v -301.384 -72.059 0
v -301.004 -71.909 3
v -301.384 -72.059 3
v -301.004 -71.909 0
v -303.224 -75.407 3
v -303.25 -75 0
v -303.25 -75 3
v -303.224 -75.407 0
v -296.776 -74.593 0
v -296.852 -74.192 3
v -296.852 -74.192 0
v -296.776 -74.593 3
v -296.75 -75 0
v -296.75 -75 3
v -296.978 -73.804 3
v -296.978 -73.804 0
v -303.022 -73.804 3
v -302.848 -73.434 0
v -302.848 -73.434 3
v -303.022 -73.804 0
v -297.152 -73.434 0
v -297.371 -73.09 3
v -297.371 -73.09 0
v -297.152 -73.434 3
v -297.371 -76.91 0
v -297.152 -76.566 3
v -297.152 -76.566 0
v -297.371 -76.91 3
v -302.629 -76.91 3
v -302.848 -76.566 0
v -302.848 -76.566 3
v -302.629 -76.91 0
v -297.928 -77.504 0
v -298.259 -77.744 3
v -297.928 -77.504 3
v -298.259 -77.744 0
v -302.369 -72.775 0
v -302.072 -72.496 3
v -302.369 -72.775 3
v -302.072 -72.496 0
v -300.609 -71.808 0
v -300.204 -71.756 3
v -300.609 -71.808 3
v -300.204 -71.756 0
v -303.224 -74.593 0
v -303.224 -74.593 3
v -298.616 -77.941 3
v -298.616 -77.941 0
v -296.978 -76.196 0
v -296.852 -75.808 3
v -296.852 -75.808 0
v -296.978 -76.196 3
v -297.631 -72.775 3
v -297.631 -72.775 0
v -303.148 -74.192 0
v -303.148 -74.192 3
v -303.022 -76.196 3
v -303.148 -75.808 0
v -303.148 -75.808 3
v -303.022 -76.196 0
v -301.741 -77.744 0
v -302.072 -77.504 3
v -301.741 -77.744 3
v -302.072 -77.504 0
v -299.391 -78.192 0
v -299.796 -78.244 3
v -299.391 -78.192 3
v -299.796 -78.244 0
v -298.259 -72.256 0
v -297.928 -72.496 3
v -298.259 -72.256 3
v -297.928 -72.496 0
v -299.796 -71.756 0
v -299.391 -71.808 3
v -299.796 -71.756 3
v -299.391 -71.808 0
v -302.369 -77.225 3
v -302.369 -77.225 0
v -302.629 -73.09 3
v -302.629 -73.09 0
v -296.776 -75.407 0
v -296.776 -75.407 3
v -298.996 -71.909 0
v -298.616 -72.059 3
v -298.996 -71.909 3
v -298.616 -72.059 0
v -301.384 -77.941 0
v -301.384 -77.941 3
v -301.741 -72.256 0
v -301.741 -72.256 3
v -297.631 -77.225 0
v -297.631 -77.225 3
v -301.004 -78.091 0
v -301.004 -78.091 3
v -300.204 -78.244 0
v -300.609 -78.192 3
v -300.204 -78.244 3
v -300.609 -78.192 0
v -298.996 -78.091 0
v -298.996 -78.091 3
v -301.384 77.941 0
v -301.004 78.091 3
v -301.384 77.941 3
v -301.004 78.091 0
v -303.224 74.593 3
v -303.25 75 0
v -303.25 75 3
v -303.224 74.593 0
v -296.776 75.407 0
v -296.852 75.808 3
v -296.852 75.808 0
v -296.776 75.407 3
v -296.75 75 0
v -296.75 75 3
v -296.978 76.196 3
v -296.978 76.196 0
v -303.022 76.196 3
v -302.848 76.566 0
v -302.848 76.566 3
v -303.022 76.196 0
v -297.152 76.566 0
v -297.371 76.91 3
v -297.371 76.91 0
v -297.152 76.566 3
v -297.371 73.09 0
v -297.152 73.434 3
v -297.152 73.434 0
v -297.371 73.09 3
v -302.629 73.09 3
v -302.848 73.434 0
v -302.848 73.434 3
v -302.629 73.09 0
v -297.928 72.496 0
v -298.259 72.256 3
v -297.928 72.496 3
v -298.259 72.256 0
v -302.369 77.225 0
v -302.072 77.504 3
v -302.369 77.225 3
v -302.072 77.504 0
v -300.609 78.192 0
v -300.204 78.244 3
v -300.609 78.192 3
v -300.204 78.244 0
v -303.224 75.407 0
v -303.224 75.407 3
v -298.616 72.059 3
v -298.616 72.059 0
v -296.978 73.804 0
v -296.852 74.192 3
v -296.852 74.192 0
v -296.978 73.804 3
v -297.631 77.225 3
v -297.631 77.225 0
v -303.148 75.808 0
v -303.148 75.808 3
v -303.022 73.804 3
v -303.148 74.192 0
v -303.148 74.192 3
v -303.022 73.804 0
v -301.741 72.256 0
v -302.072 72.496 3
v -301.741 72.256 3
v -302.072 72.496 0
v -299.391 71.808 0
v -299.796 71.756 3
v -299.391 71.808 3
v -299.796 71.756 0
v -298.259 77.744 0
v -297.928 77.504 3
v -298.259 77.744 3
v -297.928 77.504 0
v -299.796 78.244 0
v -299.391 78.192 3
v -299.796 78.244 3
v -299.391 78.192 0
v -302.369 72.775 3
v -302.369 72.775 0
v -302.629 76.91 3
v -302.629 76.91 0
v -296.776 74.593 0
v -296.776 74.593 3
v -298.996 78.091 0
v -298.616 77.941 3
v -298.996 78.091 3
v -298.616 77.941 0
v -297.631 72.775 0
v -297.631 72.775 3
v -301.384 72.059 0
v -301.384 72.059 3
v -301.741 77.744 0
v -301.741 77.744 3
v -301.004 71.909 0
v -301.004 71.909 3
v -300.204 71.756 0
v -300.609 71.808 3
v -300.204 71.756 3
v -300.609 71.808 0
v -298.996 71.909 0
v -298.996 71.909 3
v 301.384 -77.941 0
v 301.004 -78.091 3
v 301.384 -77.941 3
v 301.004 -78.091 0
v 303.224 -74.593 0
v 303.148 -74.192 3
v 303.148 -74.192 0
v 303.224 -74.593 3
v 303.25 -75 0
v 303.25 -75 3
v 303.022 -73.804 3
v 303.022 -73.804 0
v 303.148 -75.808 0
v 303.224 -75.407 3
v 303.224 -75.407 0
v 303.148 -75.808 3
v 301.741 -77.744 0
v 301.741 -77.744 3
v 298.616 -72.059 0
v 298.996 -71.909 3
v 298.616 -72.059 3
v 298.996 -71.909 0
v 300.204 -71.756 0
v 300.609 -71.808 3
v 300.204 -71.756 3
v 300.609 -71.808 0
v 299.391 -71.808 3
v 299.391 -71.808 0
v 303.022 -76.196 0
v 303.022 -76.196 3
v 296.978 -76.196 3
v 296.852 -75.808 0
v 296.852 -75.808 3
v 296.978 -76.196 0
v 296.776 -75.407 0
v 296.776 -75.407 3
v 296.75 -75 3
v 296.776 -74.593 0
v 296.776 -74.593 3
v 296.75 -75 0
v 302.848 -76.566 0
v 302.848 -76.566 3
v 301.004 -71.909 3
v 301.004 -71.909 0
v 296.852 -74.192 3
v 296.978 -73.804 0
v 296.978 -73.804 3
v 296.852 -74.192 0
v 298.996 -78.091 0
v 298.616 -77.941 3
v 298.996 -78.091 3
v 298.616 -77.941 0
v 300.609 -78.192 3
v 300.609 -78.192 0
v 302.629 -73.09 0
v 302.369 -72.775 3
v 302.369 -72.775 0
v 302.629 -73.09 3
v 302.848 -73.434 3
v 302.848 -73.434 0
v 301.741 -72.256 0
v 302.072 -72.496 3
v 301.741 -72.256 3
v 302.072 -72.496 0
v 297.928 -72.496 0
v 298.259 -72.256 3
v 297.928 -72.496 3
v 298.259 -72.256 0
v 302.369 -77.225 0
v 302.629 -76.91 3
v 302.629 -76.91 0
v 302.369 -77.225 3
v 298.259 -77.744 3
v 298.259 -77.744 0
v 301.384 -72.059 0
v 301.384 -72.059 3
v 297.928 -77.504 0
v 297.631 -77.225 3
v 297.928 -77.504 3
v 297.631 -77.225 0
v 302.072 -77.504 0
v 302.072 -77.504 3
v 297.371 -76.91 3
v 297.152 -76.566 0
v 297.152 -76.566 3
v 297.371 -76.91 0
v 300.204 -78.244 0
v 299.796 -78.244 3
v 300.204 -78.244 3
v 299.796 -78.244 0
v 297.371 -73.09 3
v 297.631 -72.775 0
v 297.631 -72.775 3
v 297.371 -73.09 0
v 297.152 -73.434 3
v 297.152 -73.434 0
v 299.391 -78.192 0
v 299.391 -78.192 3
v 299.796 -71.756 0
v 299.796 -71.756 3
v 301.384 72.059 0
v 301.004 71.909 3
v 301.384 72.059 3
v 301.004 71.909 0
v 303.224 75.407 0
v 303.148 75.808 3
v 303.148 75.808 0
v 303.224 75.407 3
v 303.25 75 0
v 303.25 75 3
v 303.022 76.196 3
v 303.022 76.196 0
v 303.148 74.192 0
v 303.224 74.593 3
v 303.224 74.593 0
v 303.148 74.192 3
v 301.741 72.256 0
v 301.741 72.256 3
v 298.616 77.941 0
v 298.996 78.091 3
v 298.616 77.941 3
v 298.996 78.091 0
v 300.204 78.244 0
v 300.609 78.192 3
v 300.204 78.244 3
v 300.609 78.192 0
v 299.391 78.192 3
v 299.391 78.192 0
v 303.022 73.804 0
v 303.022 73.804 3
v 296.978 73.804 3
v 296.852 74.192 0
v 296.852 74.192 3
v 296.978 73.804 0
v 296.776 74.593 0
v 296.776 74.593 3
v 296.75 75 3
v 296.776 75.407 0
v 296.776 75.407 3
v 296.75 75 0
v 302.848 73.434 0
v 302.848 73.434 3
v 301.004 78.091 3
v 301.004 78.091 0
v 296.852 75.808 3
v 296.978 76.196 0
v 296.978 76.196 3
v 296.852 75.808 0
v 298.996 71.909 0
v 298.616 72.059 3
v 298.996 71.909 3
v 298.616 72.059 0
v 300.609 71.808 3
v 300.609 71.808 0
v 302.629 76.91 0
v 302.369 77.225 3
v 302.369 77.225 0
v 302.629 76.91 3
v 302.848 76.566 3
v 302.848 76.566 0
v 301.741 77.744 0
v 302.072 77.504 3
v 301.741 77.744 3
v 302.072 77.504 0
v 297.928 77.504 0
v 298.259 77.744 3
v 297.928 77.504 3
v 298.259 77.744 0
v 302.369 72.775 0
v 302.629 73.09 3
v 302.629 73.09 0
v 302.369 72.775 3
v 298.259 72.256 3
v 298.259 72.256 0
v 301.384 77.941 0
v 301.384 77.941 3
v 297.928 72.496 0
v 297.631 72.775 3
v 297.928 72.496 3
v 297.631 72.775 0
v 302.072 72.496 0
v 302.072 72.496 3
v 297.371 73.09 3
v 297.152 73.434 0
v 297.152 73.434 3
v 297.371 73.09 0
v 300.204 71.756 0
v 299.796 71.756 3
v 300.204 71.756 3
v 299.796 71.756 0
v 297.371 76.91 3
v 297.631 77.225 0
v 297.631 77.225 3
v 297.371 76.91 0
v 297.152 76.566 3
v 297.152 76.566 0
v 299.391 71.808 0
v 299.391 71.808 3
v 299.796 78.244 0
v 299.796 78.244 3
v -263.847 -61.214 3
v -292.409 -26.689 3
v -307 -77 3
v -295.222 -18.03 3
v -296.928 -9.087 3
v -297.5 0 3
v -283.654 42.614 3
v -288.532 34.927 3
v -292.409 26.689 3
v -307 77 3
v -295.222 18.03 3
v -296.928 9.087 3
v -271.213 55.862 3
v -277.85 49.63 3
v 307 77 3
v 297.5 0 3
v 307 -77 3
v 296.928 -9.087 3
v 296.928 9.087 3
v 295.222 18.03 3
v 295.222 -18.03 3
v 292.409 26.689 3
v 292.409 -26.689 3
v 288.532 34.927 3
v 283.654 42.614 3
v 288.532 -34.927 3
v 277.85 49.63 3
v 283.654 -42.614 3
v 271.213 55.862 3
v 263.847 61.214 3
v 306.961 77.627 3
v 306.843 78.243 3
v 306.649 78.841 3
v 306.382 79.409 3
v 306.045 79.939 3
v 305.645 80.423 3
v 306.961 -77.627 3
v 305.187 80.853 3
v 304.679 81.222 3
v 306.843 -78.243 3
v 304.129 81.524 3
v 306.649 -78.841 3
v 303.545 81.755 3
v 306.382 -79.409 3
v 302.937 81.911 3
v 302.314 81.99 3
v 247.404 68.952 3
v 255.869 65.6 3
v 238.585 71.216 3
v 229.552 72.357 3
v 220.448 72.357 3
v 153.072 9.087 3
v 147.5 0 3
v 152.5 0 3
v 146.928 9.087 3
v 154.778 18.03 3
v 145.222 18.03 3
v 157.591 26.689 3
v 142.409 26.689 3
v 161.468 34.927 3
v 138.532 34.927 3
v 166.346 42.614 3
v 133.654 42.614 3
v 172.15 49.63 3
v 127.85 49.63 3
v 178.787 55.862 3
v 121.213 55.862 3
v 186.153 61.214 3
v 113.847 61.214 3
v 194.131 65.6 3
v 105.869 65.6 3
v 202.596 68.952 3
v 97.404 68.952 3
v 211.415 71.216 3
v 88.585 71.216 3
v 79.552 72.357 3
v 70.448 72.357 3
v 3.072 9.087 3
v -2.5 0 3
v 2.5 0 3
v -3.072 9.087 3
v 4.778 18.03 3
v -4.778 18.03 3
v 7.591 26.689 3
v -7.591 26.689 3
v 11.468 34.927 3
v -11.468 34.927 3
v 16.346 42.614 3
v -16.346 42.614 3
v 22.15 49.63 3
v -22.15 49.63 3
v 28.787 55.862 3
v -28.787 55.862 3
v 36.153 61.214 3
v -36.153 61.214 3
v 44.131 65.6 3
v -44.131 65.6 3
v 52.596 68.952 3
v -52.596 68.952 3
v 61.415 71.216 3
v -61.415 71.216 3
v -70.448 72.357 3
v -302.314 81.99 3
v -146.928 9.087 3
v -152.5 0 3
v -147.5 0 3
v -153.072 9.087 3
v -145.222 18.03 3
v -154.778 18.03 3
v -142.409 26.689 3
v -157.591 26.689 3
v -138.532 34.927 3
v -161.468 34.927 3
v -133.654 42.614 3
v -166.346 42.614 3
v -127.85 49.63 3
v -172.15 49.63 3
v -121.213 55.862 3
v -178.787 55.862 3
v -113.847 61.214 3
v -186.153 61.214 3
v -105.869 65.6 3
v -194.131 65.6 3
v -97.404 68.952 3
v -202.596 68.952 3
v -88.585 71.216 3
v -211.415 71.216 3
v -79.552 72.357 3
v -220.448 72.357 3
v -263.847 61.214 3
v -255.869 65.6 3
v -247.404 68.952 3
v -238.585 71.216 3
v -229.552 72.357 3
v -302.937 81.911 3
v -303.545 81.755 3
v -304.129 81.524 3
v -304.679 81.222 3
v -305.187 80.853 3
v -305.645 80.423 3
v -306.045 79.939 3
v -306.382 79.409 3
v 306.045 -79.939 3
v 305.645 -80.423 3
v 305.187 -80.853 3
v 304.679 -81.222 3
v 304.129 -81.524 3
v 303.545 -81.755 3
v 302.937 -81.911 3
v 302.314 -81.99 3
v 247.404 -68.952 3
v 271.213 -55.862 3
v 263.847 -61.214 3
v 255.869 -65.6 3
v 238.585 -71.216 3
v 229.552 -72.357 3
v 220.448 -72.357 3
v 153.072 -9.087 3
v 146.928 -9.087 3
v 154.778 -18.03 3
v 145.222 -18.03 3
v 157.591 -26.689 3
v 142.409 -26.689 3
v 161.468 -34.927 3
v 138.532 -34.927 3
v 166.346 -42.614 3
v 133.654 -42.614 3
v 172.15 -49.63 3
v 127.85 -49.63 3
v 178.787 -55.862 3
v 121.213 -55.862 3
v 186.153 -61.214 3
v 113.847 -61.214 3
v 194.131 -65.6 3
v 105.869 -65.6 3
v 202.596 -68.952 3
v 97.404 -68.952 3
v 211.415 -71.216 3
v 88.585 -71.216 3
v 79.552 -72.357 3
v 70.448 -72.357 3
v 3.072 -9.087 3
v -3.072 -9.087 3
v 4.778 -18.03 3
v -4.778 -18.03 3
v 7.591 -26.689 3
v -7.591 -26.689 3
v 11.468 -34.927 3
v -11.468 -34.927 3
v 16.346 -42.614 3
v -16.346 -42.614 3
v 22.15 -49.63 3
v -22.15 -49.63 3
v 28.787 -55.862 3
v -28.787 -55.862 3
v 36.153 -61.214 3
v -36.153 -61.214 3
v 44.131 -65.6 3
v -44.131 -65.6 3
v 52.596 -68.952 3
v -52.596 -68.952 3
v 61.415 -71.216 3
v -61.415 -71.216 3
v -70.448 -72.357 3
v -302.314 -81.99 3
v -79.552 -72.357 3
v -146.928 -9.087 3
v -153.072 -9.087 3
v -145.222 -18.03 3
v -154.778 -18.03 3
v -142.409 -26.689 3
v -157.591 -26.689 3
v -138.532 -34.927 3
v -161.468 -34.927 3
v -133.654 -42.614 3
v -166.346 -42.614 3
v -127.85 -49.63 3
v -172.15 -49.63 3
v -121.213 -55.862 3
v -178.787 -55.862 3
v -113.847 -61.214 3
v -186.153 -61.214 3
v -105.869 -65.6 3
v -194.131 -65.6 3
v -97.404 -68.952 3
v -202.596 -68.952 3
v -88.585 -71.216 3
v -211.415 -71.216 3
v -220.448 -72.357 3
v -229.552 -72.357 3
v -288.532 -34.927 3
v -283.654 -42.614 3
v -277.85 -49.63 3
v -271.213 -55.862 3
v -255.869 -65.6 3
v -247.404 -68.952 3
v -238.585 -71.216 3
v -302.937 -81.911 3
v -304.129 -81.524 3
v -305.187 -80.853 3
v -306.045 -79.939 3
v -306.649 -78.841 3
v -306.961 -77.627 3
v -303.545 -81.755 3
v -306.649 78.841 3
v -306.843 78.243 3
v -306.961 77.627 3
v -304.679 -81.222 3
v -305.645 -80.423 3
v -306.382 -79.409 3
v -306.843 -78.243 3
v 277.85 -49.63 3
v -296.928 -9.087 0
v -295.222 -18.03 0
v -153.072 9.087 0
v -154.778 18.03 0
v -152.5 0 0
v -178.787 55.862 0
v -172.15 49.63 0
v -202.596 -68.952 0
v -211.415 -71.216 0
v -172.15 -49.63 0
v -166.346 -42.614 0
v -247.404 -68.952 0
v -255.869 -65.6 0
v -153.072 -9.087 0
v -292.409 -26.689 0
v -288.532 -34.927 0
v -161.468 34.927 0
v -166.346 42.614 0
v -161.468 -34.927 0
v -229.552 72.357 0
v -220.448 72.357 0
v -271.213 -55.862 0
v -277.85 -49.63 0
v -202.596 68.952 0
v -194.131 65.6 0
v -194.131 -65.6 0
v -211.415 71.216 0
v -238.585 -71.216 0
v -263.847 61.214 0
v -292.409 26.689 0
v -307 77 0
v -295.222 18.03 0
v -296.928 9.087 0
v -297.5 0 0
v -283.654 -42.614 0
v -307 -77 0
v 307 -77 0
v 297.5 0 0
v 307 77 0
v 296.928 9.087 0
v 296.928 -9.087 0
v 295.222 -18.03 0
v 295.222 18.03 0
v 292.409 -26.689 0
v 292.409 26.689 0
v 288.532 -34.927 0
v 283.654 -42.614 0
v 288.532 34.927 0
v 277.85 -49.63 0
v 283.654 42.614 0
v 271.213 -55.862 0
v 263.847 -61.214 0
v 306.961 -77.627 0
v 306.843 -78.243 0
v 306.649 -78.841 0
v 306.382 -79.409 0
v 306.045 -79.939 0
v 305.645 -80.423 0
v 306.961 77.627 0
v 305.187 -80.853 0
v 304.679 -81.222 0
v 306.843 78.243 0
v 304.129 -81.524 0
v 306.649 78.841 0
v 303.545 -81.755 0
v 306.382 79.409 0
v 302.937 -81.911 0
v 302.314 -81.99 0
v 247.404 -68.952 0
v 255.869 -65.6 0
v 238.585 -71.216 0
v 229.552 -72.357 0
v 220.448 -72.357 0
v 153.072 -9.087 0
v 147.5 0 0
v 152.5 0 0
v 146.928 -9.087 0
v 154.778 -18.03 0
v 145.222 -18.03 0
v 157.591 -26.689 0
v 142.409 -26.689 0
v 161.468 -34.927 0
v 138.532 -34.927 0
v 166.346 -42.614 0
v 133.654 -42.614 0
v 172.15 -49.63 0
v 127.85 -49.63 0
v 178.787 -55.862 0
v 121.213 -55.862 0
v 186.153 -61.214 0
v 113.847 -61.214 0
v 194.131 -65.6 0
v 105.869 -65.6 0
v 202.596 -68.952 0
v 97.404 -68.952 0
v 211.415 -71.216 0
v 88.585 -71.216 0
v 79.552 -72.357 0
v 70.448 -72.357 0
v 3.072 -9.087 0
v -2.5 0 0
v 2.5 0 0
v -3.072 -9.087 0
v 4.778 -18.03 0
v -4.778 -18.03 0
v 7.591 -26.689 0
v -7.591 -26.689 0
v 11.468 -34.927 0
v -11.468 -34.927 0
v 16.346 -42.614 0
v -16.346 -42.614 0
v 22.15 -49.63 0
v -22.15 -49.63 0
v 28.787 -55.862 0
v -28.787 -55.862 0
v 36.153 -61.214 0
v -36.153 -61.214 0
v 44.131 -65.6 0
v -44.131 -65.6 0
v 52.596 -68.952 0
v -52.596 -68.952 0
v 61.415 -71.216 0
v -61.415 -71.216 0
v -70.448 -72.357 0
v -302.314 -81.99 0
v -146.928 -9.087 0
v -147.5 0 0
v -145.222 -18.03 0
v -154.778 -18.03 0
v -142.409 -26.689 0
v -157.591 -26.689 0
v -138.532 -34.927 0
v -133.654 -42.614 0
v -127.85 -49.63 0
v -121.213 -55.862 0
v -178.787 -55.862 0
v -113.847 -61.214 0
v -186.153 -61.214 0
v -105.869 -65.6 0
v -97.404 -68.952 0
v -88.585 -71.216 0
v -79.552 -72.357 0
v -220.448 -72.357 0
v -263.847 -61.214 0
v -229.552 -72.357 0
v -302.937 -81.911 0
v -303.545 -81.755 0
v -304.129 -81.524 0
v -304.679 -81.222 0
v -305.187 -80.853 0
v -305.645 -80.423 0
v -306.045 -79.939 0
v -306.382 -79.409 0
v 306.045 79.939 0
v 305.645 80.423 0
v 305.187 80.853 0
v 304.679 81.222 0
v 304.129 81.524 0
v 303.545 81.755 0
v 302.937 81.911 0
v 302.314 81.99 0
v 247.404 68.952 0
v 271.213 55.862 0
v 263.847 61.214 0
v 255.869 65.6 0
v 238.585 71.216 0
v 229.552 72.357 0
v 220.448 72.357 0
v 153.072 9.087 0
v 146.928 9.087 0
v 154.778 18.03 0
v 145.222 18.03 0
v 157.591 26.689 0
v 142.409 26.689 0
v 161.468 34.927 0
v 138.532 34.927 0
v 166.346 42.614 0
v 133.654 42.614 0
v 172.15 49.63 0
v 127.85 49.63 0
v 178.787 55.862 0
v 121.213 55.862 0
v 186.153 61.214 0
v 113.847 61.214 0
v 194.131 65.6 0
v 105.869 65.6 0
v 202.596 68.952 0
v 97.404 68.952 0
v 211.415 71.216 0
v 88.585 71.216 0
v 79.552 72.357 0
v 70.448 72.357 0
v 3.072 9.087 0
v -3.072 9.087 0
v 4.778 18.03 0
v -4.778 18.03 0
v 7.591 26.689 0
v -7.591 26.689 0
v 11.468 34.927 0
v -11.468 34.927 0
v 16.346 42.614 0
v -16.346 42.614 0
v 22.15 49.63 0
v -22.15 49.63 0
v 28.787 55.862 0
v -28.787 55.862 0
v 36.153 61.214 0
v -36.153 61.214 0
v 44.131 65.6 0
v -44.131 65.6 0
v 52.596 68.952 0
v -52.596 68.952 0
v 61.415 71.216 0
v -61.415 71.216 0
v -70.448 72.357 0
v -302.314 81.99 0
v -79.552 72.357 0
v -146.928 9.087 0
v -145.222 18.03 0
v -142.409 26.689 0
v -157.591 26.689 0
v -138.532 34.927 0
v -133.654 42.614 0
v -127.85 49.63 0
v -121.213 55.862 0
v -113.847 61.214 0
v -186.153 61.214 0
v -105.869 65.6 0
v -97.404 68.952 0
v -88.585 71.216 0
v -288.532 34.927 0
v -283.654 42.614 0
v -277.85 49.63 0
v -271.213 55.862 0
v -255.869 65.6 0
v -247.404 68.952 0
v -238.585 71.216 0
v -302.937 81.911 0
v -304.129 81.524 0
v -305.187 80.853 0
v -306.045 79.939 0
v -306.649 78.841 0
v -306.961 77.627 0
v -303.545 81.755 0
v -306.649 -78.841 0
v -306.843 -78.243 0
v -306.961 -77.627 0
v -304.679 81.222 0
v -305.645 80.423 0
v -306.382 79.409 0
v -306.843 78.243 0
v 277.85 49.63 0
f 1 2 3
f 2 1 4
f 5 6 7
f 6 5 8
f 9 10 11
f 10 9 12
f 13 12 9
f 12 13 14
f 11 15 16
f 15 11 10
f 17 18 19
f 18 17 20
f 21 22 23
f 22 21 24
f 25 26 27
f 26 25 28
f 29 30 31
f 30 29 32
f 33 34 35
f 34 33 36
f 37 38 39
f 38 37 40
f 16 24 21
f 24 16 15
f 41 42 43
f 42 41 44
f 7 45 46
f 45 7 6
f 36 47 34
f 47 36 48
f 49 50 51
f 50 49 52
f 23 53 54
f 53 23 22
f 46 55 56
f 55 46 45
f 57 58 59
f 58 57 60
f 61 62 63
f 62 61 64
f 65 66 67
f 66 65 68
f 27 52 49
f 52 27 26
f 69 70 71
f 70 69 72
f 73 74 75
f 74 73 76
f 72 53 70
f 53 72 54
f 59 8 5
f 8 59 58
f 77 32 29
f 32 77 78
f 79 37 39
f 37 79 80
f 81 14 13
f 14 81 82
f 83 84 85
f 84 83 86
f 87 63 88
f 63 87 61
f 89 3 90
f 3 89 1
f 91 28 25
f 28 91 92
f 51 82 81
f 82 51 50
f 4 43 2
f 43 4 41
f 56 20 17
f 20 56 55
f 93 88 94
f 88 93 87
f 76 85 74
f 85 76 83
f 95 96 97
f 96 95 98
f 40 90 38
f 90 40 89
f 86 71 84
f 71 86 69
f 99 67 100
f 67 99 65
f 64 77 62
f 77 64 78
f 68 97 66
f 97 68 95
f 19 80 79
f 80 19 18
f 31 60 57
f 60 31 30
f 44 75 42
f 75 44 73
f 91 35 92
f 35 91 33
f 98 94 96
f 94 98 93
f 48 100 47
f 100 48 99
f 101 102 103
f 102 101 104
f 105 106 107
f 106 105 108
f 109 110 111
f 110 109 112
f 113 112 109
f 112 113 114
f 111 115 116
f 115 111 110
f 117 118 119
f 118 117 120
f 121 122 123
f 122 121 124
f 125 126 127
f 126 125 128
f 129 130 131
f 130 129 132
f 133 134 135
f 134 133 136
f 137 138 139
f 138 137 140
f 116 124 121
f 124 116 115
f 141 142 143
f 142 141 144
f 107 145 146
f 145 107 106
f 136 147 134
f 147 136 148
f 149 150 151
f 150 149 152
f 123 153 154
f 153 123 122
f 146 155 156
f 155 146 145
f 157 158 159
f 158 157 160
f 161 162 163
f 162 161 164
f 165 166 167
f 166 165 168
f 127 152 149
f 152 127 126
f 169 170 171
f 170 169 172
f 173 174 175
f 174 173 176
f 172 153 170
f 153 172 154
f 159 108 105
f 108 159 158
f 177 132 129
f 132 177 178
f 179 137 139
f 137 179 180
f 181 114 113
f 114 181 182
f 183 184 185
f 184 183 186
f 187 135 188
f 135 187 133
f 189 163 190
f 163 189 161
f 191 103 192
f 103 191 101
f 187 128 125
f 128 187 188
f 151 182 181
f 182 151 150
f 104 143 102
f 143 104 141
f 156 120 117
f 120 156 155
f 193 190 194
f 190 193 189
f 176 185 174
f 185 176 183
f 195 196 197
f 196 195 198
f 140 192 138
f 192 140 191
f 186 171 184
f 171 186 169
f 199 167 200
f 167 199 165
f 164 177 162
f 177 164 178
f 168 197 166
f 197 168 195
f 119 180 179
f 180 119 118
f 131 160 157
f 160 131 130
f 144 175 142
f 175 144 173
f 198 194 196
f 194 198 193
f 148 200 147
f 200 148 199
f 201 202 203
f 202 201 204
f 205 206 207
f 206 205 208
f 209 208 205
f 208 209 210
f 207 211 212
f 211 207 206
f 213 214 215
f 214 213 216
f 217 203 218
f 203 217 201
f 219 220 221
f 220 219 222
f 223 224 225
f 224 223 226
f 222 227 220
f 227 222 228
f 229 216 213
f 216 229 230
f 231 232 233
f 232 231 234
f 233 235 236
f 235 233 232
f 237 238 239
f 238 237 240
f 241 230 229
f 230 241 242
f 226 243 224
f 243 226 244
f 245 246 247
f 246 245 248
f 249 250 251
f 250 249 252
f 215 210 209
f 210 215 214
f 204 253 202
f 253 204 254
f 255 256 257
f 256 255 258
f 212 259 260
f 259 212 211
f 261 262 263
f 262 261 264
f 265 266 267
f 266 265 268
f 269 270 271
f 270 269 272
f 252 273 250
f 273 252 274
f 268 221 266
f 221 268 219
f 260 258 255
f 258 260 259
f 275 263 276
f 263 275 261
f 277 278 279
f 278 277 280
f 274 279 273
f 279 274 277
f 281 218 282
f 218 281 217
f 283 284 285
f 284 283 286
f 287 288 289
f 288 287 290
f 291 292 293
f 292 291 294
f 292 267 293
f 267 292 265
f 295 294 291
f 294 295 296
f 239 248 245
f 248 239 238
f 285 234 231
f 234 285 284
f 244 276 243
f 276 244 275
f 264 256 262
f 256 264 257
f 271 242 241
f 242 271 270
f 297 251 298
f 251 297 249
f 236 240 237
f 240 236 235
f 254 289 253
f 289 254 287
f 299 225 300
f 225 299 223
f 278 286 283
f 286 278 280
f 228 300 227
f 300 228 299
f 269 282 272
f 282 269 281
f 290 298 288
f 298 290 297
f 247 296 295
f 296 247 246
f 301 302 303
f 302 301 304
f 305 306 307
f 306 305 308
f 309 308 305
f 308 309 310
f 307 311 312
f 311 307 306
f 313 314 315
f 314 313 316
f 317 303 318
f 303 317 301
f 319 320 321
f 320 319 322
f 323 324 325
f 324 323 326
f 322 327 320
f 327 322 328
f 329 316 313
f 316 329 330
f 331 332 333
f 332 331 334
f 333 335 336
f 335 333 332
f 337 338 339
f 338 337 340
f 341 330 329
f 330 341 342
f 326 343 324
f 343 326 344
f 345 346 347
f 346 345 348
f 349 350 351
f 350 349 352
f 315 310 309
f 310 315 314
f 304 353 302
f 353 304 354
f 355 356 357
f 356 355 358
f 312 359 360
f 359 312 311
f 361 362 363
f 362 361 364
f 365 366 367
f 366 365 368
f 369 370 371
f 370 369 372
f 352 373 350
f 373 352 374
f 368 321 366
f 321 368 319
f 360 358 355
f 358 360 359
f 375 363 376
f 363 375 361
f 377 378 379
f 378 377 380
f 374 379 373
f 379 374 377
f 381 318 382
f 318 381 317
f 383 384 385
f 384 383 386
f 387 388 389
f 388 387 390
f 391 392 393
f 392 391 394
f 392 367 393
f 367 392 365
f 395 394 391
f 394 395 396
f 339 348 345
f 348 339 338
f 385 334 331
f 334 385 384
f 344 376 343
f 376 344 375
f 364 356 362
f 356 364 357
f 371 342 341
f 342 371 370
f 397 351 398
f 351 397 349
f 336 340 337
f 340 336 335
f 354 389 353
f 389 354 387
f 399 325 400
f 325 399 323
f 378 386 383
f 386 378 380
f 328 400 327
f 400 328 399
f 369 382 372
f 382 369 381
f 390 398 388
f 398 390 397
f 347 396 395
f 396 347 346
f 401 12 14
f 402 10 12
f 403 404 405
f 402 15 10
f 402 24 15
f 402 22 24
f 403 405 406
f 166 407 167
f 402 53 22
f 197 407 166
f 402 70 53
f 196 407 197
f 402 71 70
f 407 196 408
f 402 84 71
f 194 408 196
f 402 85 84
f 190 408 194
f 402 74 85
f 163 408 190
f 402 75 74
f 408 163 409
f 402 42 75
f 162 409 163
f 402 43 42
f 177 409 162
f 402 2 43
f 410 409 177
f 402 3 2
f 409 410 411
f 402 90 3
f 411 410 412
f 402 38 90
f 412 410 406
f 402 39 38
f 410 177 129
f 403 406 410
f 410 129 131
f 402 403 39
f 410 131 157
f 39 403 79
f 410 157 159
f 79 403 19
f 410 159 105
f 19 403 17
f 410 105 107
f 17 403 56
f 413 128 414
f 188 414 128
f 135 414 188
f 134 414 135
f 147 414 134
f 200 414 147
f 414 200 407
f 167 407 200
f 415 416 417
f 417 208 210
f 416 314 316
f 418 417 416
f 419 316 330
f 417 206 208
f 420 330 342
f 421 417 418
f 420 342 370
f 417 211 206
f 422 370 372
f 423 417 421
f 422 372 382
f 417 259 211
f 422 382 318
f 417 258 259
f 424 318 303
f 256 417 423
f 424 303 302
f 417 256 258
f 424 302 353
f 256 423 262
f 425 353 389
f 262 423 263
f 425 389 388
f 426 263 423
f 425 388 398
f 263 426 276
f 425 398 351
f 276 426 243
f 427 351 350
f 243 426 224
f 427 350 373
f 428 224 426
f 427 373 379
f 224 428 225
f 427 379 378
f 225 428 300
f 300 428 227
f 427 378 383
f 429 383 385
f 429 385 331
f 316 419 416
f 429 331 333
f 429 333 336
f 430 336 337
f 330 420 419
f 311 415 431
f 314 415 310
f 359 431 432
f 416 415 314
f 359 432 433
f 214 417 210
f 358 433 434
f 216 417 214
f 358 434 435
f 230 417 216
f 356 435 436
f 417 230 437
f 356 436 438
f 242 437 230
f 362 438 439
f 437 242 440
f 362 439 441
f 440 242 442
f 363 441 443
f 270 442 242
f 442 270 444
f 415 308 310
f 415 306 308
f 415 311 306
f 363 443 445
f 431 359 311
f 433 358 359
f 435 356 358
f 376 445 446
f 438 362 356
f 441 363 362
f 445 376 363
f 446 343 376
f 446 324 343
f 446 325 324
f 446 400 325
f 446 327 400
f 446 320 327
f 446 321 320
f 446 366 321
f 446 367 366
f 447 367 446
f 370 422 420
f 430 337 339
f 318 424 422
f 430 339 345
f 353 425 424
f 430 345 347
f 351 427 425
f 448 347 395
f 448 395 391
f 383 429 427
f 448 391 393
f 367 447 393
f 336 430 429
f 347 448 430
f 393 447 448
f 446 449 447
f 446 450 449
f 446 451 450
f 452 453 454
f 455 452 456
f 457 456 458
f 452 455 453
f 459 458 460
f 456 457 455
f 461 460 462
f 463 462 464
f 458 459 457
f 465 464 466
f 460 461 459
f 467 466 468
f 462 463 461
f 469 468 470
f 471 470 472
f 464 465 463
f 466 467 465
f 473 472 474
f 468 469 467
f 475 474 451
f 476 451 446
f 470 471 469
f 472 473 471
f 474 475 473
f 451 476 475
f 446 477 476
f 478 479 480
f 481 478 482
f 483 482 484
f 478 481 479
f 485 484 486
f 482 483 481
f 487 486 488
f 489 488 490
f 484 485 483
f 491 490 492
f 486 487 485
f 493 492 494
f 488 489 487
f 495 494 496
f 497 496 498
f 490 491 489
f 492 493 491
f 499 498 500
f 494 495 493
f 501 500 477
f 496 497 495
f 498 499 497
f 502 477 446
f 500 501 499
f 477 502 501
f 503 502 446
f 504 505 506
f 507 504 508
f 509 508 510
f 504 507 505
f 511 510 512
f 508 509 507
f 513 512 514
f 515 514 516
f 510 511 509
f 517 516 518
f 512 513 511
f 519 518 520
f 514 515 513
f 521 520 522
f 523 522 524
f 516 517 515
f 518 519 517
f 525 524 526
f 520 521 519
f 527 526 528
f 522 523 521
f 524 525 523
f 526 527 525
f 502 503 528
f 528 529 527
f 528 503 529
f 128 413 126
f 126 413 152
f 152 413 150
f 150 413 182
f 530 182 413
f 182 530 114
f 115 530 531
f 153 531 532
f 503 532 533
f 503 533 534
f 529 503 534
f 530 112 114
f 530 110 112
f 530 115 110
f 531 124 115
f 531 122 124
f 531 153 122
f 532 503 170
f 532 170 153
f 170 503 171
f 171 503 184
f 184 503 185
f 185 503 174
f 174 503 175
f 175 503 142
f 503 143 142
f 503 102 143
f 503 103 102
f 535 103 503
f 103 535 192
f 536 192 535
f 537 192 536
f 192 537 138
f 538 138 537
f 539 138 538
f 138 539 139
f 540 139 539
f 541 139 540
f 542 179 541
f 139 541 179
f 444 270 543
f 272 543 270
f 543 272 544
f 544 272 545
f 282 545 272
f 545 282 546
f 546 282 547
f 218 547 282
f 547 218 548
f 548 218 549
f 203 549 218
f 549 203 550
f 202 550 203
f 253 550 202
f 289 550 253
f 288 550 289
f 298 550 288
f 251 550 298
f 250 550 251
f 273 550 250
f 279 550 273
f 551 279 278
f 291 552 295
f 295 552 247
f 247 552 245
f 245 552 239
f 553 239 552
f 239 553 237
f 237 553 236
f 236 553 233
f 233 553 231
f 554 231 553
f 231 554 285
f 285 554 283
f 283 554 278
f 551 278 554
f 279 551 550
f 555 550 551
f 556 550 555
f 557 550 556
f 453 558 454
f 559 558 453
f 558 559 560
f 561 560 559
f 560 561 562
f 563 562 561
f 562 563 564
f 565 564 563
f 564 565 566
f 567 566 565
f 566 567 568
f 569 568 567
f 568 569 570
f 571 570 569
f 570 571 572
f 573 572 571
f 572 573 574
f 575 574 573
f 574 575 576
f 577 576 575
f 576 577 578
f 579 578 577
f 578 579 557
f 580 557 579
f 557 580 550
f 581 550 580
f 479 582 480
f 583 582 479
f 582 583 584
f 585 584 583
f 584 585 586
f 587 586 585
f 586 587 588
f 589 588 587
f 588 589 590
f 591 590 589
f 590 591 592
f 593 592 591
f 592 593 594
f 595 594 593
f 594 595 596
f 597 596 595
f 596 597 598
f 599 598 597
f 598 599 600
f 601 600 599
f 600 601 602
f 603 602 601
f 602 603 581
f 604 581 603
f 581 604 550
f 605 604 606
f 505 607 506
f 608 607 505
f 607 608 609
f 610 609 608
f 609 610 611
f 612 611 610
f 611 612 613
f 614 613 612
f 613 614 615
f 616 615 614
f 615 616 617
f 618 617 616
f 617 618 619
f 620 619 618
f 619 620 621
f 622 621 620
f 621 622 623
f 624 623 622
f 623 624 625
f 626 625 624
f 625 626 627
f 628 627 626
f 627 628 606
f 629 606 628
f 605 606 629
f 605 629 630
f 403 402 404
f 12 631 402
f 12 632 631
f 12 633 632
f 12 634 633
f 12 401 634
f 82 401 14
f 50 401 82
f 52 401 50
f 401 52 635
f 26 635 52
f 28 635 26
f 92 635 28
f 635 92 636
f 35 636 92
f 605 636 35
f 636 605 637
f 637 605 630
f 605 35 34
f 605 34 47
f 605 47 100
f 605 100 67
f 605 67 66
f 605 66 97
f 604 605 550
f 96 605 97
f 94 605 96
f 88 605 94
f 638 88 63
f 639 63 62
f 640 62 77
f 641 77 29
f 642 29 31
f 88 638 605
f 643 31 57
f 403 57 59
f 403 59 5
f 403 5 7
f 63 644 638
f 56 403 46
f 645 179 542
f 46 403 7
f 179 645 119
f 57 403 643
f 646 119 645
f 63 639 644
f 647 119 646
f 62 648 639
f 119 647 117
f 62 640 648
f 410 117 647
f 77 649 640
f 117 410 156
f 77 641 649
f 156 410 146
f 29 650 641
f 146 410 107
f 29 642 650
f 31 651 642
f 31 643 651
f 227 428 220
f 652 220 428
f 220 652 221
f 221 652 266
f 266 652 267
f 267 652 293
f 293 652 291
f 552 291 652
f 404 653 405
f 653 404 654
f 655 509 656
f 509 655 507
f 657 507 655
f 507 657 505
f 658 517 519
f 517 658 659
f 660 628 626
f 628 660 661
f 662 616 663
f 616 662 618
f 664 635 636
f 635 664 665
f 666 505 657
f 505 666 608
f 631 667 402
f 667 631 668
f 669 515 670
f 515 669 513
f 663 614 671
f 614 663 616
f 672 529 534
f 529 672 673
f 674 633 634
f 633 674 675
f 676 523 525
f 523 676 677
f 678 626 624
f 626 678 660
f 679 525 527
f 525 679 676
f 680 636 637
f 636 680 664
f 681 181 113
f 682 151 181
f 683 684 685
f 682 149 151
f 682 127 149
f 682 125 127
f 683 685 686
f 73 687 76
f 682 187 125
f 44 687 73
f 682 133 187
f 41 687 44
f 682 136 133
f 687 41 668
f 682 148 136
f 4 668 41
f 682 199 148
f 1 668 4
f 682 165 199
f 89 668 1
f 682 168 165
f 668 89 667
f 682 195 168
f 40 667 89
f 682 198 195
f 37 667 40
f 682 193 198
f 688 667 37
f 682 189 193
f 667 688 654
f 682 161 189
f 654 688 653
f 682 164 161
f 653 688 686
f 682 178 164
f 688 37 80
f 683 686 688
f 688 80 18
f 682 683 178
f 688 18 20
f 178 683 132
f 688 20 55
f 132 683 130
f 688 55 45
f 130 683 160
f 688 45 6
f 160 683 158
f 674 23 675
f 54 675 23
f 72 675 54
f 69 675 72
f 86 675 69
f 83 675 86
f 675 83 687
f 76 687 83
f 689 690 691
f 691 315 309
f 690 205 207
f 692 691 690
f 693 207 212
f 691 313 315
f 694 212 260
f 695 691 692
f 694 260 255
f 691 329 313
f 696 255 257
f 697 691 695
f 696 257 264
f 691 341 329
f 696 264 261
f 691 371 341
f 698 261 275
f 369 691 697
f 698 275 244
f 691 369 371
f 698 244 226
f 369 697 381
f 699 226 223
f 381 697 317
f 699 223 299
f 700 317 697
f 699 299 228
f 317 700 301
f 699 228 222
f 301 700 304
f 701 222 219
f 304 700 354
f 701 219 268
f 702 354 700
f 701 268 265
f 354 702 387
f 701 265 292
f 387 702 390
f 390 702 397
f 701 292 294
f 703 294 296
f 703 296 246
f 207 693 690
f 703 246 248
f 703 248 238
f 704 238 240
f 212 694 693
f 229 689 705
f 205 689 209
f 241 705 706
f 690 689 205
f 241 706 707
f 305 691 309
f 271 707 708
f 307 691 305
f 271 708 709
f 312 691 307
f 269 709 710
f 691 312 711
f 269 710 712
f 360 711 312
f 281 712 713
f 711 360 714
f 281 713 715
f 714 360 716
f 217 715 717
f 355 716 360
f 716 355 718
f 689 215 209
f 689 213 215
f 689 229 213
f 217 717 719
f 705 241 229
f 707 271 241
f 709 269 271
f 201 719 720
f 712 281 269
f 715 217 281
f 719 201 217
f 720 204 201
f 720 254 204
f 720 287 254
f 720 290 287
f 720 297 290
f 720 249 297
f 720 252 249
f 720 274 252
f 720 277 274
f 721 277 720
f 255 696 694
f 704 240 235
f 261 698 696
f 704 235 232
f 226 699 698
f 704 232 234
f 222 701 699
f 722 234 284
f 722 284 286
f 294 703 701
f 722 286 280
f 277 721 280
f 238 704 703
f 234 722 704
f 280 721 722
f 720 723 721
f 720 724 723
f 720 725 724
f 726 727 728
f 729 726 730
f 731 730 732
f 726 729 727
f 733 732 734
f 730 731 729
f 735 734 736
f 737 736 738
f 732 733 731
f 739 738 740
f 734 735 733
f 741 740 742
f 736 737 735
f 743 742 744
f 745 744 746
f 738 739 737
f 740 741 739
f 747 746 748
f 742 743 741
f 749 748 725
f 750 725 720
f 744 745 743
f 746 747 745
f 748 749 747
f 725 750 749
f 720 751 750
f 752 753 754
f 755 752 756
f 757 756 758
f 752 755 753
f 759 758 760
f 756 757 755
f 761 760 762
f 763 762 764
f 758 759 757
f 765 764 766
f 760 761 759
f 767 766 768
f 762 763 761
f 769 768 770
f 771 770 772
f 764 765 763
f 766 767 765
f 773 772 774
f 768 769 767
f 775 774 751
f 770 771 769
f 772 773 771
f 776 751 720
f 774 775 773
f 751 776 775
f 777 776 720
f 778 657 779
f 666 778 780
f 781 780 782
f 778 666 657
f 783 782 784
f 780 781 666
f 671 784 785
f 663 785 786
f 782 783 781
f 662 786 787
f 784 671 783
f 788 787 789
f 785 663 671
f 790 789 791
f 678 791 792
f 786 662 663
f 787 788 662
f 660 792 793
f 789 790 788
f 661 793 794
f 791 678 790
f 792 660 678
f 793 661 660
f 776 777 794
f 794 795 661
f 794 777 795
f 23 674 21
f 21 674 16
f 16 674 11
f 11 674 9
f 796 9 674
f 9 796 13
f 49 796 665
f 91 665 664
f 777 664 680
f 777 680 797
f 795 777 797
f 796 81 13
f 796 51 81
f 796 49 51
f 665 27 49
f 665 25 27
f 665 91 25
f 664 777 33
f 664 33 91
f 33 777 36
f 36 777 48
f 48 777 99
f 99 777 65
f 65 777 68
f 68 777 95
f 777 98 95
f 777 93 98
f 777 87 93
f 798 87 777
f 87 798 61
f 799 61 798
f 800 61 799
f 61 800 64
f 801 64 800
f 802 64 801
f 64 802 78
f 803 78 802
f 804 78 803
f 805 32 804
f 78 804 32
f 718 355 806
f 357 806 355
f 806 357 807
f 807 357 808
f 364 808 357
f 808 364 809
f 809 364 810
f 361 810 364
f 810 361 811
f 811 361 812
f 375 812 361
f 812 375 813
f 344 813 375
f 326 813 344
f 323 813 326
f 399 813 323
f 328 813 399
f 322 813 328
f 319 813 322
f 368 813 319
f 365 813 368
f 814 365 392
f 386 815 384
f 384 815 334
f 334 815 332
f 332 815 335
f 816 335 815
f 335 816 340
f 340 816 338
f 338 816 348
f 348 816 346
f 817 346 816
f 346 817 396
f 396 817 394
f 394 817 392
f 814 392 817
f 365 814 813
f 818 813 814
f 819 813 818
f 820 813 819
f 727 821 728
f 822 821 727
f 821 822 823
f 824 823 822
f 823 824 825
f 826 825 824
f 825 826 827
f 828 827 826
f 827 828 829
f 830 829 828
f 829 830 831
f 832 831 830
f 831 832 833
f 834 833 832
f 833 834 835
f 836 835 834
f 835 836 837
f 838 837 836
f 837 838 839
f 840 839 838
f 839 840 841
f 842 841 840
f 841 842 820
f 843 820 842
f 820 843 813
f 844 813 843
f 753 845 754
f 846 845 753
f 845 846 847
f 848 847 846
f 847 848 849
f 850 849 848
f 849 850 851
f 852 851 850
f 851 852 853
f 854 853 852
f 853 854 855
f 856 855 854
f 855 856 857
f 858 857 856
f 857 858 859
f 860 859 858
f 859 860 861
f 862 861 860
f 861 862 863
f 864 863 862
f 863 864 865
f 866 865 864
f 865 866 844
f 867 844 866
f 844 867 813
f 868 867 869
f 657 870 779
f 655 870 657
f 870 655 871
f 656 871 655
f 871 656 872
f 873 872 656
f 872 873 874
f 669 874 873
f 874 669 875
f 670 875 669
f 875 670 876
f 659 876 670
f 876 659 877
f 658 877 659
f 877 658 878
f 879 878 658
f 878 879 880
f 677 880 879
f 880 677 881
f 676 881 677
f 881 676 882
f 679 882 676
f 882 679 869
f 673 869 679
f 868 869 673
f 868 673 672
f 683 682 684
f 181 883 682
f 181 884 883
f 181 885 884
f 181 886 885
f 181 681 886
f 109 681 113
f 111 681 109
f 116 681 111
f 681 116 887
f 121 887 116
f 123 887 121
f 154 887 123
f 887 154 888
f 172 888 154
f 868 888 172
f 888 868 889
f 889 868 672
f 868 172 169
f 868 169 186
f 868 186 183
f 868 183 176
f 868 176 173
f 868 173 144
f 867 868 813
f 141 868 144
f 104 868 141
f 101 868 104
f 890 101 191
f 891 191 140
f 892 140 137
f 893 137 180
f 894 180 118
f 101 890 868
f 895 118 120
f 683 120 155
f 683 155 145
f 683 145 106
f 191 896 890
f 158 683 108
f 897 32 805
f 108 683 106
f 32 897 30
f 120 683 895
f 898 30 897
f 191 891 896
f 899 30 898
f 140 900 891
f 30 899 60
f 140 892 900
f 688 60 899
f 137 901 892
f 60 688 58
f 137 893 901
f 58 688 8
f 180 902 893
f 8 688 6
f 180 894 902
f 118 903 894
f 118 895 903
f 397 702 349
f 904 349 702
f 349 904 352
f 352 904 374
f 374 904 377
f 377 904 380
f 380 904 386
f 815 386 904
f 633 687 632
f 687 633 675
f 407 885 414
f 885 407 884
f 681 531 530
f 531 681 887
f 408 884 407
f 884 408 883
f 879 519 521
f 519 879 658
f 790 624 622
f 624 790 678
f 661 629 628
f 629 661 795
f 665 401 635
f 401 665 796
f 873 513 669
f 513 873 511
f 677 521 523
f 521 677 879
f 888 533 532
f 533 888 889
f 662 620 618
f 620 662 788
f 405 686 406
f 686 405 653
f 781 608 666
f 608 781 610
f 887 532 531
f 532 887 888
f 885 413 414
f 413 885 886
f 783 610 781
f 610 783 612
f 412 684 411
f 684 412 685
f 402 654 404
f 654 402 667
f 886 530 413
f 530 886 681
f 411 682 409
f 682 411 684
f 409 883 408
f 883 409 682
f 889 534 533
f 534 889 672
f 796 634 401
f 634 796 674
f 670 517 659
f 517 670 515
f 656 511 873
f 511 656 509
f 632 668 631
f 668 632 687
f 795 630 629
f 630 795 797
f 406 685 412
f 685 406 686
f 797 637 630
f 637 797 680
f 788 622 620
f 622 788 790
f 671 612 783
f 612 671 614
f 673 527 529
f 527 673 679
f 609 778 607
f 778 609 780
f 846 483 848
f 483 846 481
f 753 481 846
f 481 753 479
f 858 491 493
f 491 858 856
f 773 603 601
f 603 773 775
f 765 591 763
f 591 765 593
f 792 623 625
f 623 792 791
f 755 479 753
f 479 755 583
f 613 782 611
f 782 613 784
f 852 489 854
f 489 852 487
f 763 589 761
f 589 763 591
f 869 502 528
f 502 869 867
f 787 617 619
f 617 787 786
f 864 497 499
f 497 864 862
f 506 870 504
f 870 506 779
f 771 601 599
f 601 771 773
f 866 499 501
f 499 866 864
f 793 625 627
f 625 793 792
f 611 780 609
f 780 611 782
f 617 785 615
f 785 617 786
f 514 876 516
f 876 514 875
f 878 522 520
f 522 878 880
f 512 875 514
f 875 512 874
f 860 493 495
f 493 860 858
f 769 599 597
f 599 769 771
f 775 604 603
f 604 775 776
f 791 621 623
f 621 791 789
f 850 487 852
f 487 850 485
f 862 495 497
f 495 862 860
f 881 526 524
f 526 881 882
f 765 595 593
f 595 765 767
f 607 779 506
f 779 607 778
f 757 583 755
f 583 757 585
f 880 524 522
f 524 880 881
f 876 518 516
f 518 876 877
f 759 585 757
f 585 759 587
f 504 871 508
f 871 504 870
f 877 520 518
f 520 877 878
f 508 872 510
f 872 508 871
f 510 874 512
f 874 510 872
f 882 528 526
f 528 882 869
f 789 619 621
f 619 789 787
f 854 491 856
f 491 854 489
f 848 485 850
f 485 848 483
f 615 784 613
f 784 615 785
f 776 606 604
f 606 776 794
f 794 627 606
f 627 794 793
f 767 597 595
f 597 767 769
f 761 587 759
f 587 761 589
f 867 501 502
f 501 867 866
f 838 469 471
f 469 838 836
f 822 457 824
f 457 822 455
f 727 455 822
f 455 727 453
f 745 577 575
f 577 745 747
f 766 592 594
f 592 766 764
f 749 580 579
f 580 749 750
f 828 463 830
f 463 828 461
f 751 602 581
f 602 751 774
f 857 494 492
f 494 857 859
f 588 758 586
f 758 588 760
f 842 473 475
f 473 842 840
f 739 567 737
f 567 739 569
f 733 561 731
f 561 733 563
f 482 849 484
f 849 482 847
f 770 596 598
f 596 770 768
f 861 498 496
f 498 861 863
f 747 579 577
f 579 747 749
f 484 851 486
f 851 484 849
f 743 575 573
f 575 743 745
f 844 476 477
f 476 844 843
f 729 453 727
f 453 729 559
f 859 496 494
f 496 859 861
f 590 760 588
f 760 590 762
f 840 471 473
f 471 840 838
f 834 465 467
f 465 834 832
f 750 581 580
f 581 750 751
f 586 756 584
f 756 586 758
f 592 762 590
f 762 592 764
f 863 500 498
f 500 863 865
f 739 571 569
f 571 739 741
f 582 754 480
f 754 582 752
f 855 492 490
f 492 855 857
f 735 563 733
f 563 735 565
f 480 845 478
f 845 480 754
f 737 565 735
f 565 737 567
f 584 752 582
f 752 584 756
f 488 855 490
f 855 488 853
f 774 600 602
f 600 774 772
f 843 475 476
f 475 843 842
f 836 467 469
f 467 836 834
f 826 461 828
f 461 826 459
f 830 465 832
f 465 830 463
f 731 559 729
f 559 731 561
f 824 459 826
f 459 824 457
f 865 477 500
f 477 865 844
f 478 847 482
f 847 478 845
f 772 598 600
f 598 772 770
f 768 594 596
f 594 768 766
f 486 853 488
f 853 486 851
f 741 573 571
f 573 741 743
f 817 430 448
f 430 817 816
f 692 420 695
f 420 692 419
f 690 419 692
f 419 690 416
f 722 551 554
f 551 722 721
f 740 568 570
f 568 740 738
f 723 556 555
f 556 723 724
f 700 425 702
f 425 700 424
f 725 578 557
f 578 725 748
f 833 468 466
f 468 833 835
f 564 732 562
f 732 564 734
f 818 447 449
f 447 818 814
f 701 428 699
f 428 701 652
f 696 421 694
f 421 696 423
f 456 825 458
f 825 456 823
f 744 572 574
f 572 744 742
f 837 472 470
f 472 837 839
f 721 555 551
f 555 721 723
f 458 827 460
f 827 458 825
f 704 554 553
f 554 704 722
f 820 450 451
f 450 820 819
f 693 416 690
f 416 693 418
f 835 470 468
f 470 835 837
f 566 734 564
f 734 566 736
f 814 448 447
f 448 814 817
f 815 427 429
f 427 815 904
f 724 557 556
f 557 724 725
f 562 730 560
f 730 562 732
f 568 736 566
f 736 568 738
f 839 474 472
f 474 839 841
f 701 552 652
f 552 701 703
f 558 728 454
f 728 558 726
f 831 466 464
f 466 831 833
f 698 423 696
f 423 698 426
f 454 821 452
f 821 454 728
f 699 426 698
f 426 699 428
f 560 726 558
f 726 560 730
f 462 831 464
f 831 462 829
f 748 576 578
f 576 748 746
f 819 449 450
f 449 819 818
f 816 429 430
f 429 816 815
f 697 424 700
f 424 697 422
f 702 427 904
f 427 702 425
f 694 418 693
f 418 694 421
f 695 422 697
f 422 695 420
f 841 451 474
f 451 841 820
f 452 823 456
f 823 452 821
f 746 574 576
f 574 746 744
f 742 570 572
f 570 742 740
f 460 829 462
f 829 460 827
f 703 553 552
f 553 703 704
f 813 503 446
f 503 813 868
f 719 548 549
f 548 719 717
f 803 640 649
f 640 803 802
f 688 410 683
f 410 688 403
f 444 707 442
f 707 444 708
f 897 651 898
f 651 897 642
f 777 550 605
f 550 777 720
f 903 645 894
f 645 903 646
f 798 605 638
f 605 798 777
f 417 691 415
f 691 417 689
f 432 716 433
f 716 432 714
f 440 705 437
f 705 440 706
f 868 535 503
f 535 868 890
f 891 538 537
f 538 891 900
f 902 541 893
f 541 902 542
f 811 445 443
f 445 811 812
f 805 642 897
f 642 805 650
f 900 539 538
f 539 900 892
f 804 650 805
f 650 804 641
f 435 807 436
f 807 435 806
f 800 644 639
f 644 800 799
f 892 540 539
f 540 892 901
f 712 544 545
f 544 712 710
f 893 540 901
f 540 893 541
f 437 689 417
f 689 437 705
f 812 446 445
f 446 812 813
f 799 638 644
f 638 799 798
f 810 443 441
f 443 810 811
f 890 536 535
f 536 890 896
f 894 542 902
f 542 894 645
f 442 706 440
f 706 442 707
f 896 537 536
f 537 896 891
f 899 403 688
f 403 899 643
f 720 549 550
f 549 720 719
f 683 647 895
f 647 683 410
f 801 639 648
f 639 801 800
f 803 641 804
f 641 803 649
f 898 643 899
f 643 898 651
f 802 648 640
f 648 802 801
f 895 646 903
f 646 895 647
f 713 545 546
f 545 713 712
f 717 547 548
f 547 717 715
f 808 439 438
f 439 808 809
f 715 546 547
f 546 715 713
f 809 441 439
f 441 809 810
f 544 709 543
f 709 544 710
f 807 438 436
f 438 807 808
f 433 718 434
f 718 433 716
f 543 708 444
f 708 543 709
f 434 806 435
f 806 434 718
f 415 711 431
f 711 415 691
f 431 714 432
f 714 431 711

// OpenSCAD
$fn = 50;


difference() {
	union() {
		hull() {
			translate(v = [-302.0000000000, 77.0000000000, 0]) {
				cylinder(h = 3, r = 5);
			}
			translate(v = [302.0000000000, 77.0000000000, 0]) {
				cylinder(h = 3, r = 5);
			}
			translate(v = [-302.0000000000, -77.0000000000, 0]) {
				cylinder(h = 3, r = 5);
			}
			translate(v = [302.0000000000, -77.0000000000, 0]) {
				cylinder(h = 3, r = 5);
			}
		}
	}
	union() {
		#translate(v = [-300.0000000000, -75.0000000000, -100.0000000000]) {
			cylinder(h = 200, r = 3.2500000000);
		}
		#translate(v = [-300.0000000000, 75.0000000000, -100.0000000000]) {
			cylinder(h = 200, r = 3.2500000000);
		}
		#translate(v = [300.0000000000, -75.0000000000, -100.0000000000]) {
			cylinder(h = 200, r = 3.2500000000);
		}
		#translate(v = [300.0000000000, 75.0000000000, -100.0000000000]) {
			cylinder(h = 200, r = 3.2500000000);
		}
		#translate(v = [-225.0000000000, 0, 0]) {
			cylinder(h = 3, r = 72.5000000000);
		}
		#translate(v = [-75.0000000000, 0, 0]) {
			cylinder(h = 3, r = 72.5000000000);
		}
		#translate(v = [75.0000000000, 0, 0]) {
			cylinder(h = 3, r = 72.5000000000);
		}
		#translate(v = [225.0000000000, 0, 0]) {
			cylinder(h = 3, r = 72.5000000000);
		}
	}
}
